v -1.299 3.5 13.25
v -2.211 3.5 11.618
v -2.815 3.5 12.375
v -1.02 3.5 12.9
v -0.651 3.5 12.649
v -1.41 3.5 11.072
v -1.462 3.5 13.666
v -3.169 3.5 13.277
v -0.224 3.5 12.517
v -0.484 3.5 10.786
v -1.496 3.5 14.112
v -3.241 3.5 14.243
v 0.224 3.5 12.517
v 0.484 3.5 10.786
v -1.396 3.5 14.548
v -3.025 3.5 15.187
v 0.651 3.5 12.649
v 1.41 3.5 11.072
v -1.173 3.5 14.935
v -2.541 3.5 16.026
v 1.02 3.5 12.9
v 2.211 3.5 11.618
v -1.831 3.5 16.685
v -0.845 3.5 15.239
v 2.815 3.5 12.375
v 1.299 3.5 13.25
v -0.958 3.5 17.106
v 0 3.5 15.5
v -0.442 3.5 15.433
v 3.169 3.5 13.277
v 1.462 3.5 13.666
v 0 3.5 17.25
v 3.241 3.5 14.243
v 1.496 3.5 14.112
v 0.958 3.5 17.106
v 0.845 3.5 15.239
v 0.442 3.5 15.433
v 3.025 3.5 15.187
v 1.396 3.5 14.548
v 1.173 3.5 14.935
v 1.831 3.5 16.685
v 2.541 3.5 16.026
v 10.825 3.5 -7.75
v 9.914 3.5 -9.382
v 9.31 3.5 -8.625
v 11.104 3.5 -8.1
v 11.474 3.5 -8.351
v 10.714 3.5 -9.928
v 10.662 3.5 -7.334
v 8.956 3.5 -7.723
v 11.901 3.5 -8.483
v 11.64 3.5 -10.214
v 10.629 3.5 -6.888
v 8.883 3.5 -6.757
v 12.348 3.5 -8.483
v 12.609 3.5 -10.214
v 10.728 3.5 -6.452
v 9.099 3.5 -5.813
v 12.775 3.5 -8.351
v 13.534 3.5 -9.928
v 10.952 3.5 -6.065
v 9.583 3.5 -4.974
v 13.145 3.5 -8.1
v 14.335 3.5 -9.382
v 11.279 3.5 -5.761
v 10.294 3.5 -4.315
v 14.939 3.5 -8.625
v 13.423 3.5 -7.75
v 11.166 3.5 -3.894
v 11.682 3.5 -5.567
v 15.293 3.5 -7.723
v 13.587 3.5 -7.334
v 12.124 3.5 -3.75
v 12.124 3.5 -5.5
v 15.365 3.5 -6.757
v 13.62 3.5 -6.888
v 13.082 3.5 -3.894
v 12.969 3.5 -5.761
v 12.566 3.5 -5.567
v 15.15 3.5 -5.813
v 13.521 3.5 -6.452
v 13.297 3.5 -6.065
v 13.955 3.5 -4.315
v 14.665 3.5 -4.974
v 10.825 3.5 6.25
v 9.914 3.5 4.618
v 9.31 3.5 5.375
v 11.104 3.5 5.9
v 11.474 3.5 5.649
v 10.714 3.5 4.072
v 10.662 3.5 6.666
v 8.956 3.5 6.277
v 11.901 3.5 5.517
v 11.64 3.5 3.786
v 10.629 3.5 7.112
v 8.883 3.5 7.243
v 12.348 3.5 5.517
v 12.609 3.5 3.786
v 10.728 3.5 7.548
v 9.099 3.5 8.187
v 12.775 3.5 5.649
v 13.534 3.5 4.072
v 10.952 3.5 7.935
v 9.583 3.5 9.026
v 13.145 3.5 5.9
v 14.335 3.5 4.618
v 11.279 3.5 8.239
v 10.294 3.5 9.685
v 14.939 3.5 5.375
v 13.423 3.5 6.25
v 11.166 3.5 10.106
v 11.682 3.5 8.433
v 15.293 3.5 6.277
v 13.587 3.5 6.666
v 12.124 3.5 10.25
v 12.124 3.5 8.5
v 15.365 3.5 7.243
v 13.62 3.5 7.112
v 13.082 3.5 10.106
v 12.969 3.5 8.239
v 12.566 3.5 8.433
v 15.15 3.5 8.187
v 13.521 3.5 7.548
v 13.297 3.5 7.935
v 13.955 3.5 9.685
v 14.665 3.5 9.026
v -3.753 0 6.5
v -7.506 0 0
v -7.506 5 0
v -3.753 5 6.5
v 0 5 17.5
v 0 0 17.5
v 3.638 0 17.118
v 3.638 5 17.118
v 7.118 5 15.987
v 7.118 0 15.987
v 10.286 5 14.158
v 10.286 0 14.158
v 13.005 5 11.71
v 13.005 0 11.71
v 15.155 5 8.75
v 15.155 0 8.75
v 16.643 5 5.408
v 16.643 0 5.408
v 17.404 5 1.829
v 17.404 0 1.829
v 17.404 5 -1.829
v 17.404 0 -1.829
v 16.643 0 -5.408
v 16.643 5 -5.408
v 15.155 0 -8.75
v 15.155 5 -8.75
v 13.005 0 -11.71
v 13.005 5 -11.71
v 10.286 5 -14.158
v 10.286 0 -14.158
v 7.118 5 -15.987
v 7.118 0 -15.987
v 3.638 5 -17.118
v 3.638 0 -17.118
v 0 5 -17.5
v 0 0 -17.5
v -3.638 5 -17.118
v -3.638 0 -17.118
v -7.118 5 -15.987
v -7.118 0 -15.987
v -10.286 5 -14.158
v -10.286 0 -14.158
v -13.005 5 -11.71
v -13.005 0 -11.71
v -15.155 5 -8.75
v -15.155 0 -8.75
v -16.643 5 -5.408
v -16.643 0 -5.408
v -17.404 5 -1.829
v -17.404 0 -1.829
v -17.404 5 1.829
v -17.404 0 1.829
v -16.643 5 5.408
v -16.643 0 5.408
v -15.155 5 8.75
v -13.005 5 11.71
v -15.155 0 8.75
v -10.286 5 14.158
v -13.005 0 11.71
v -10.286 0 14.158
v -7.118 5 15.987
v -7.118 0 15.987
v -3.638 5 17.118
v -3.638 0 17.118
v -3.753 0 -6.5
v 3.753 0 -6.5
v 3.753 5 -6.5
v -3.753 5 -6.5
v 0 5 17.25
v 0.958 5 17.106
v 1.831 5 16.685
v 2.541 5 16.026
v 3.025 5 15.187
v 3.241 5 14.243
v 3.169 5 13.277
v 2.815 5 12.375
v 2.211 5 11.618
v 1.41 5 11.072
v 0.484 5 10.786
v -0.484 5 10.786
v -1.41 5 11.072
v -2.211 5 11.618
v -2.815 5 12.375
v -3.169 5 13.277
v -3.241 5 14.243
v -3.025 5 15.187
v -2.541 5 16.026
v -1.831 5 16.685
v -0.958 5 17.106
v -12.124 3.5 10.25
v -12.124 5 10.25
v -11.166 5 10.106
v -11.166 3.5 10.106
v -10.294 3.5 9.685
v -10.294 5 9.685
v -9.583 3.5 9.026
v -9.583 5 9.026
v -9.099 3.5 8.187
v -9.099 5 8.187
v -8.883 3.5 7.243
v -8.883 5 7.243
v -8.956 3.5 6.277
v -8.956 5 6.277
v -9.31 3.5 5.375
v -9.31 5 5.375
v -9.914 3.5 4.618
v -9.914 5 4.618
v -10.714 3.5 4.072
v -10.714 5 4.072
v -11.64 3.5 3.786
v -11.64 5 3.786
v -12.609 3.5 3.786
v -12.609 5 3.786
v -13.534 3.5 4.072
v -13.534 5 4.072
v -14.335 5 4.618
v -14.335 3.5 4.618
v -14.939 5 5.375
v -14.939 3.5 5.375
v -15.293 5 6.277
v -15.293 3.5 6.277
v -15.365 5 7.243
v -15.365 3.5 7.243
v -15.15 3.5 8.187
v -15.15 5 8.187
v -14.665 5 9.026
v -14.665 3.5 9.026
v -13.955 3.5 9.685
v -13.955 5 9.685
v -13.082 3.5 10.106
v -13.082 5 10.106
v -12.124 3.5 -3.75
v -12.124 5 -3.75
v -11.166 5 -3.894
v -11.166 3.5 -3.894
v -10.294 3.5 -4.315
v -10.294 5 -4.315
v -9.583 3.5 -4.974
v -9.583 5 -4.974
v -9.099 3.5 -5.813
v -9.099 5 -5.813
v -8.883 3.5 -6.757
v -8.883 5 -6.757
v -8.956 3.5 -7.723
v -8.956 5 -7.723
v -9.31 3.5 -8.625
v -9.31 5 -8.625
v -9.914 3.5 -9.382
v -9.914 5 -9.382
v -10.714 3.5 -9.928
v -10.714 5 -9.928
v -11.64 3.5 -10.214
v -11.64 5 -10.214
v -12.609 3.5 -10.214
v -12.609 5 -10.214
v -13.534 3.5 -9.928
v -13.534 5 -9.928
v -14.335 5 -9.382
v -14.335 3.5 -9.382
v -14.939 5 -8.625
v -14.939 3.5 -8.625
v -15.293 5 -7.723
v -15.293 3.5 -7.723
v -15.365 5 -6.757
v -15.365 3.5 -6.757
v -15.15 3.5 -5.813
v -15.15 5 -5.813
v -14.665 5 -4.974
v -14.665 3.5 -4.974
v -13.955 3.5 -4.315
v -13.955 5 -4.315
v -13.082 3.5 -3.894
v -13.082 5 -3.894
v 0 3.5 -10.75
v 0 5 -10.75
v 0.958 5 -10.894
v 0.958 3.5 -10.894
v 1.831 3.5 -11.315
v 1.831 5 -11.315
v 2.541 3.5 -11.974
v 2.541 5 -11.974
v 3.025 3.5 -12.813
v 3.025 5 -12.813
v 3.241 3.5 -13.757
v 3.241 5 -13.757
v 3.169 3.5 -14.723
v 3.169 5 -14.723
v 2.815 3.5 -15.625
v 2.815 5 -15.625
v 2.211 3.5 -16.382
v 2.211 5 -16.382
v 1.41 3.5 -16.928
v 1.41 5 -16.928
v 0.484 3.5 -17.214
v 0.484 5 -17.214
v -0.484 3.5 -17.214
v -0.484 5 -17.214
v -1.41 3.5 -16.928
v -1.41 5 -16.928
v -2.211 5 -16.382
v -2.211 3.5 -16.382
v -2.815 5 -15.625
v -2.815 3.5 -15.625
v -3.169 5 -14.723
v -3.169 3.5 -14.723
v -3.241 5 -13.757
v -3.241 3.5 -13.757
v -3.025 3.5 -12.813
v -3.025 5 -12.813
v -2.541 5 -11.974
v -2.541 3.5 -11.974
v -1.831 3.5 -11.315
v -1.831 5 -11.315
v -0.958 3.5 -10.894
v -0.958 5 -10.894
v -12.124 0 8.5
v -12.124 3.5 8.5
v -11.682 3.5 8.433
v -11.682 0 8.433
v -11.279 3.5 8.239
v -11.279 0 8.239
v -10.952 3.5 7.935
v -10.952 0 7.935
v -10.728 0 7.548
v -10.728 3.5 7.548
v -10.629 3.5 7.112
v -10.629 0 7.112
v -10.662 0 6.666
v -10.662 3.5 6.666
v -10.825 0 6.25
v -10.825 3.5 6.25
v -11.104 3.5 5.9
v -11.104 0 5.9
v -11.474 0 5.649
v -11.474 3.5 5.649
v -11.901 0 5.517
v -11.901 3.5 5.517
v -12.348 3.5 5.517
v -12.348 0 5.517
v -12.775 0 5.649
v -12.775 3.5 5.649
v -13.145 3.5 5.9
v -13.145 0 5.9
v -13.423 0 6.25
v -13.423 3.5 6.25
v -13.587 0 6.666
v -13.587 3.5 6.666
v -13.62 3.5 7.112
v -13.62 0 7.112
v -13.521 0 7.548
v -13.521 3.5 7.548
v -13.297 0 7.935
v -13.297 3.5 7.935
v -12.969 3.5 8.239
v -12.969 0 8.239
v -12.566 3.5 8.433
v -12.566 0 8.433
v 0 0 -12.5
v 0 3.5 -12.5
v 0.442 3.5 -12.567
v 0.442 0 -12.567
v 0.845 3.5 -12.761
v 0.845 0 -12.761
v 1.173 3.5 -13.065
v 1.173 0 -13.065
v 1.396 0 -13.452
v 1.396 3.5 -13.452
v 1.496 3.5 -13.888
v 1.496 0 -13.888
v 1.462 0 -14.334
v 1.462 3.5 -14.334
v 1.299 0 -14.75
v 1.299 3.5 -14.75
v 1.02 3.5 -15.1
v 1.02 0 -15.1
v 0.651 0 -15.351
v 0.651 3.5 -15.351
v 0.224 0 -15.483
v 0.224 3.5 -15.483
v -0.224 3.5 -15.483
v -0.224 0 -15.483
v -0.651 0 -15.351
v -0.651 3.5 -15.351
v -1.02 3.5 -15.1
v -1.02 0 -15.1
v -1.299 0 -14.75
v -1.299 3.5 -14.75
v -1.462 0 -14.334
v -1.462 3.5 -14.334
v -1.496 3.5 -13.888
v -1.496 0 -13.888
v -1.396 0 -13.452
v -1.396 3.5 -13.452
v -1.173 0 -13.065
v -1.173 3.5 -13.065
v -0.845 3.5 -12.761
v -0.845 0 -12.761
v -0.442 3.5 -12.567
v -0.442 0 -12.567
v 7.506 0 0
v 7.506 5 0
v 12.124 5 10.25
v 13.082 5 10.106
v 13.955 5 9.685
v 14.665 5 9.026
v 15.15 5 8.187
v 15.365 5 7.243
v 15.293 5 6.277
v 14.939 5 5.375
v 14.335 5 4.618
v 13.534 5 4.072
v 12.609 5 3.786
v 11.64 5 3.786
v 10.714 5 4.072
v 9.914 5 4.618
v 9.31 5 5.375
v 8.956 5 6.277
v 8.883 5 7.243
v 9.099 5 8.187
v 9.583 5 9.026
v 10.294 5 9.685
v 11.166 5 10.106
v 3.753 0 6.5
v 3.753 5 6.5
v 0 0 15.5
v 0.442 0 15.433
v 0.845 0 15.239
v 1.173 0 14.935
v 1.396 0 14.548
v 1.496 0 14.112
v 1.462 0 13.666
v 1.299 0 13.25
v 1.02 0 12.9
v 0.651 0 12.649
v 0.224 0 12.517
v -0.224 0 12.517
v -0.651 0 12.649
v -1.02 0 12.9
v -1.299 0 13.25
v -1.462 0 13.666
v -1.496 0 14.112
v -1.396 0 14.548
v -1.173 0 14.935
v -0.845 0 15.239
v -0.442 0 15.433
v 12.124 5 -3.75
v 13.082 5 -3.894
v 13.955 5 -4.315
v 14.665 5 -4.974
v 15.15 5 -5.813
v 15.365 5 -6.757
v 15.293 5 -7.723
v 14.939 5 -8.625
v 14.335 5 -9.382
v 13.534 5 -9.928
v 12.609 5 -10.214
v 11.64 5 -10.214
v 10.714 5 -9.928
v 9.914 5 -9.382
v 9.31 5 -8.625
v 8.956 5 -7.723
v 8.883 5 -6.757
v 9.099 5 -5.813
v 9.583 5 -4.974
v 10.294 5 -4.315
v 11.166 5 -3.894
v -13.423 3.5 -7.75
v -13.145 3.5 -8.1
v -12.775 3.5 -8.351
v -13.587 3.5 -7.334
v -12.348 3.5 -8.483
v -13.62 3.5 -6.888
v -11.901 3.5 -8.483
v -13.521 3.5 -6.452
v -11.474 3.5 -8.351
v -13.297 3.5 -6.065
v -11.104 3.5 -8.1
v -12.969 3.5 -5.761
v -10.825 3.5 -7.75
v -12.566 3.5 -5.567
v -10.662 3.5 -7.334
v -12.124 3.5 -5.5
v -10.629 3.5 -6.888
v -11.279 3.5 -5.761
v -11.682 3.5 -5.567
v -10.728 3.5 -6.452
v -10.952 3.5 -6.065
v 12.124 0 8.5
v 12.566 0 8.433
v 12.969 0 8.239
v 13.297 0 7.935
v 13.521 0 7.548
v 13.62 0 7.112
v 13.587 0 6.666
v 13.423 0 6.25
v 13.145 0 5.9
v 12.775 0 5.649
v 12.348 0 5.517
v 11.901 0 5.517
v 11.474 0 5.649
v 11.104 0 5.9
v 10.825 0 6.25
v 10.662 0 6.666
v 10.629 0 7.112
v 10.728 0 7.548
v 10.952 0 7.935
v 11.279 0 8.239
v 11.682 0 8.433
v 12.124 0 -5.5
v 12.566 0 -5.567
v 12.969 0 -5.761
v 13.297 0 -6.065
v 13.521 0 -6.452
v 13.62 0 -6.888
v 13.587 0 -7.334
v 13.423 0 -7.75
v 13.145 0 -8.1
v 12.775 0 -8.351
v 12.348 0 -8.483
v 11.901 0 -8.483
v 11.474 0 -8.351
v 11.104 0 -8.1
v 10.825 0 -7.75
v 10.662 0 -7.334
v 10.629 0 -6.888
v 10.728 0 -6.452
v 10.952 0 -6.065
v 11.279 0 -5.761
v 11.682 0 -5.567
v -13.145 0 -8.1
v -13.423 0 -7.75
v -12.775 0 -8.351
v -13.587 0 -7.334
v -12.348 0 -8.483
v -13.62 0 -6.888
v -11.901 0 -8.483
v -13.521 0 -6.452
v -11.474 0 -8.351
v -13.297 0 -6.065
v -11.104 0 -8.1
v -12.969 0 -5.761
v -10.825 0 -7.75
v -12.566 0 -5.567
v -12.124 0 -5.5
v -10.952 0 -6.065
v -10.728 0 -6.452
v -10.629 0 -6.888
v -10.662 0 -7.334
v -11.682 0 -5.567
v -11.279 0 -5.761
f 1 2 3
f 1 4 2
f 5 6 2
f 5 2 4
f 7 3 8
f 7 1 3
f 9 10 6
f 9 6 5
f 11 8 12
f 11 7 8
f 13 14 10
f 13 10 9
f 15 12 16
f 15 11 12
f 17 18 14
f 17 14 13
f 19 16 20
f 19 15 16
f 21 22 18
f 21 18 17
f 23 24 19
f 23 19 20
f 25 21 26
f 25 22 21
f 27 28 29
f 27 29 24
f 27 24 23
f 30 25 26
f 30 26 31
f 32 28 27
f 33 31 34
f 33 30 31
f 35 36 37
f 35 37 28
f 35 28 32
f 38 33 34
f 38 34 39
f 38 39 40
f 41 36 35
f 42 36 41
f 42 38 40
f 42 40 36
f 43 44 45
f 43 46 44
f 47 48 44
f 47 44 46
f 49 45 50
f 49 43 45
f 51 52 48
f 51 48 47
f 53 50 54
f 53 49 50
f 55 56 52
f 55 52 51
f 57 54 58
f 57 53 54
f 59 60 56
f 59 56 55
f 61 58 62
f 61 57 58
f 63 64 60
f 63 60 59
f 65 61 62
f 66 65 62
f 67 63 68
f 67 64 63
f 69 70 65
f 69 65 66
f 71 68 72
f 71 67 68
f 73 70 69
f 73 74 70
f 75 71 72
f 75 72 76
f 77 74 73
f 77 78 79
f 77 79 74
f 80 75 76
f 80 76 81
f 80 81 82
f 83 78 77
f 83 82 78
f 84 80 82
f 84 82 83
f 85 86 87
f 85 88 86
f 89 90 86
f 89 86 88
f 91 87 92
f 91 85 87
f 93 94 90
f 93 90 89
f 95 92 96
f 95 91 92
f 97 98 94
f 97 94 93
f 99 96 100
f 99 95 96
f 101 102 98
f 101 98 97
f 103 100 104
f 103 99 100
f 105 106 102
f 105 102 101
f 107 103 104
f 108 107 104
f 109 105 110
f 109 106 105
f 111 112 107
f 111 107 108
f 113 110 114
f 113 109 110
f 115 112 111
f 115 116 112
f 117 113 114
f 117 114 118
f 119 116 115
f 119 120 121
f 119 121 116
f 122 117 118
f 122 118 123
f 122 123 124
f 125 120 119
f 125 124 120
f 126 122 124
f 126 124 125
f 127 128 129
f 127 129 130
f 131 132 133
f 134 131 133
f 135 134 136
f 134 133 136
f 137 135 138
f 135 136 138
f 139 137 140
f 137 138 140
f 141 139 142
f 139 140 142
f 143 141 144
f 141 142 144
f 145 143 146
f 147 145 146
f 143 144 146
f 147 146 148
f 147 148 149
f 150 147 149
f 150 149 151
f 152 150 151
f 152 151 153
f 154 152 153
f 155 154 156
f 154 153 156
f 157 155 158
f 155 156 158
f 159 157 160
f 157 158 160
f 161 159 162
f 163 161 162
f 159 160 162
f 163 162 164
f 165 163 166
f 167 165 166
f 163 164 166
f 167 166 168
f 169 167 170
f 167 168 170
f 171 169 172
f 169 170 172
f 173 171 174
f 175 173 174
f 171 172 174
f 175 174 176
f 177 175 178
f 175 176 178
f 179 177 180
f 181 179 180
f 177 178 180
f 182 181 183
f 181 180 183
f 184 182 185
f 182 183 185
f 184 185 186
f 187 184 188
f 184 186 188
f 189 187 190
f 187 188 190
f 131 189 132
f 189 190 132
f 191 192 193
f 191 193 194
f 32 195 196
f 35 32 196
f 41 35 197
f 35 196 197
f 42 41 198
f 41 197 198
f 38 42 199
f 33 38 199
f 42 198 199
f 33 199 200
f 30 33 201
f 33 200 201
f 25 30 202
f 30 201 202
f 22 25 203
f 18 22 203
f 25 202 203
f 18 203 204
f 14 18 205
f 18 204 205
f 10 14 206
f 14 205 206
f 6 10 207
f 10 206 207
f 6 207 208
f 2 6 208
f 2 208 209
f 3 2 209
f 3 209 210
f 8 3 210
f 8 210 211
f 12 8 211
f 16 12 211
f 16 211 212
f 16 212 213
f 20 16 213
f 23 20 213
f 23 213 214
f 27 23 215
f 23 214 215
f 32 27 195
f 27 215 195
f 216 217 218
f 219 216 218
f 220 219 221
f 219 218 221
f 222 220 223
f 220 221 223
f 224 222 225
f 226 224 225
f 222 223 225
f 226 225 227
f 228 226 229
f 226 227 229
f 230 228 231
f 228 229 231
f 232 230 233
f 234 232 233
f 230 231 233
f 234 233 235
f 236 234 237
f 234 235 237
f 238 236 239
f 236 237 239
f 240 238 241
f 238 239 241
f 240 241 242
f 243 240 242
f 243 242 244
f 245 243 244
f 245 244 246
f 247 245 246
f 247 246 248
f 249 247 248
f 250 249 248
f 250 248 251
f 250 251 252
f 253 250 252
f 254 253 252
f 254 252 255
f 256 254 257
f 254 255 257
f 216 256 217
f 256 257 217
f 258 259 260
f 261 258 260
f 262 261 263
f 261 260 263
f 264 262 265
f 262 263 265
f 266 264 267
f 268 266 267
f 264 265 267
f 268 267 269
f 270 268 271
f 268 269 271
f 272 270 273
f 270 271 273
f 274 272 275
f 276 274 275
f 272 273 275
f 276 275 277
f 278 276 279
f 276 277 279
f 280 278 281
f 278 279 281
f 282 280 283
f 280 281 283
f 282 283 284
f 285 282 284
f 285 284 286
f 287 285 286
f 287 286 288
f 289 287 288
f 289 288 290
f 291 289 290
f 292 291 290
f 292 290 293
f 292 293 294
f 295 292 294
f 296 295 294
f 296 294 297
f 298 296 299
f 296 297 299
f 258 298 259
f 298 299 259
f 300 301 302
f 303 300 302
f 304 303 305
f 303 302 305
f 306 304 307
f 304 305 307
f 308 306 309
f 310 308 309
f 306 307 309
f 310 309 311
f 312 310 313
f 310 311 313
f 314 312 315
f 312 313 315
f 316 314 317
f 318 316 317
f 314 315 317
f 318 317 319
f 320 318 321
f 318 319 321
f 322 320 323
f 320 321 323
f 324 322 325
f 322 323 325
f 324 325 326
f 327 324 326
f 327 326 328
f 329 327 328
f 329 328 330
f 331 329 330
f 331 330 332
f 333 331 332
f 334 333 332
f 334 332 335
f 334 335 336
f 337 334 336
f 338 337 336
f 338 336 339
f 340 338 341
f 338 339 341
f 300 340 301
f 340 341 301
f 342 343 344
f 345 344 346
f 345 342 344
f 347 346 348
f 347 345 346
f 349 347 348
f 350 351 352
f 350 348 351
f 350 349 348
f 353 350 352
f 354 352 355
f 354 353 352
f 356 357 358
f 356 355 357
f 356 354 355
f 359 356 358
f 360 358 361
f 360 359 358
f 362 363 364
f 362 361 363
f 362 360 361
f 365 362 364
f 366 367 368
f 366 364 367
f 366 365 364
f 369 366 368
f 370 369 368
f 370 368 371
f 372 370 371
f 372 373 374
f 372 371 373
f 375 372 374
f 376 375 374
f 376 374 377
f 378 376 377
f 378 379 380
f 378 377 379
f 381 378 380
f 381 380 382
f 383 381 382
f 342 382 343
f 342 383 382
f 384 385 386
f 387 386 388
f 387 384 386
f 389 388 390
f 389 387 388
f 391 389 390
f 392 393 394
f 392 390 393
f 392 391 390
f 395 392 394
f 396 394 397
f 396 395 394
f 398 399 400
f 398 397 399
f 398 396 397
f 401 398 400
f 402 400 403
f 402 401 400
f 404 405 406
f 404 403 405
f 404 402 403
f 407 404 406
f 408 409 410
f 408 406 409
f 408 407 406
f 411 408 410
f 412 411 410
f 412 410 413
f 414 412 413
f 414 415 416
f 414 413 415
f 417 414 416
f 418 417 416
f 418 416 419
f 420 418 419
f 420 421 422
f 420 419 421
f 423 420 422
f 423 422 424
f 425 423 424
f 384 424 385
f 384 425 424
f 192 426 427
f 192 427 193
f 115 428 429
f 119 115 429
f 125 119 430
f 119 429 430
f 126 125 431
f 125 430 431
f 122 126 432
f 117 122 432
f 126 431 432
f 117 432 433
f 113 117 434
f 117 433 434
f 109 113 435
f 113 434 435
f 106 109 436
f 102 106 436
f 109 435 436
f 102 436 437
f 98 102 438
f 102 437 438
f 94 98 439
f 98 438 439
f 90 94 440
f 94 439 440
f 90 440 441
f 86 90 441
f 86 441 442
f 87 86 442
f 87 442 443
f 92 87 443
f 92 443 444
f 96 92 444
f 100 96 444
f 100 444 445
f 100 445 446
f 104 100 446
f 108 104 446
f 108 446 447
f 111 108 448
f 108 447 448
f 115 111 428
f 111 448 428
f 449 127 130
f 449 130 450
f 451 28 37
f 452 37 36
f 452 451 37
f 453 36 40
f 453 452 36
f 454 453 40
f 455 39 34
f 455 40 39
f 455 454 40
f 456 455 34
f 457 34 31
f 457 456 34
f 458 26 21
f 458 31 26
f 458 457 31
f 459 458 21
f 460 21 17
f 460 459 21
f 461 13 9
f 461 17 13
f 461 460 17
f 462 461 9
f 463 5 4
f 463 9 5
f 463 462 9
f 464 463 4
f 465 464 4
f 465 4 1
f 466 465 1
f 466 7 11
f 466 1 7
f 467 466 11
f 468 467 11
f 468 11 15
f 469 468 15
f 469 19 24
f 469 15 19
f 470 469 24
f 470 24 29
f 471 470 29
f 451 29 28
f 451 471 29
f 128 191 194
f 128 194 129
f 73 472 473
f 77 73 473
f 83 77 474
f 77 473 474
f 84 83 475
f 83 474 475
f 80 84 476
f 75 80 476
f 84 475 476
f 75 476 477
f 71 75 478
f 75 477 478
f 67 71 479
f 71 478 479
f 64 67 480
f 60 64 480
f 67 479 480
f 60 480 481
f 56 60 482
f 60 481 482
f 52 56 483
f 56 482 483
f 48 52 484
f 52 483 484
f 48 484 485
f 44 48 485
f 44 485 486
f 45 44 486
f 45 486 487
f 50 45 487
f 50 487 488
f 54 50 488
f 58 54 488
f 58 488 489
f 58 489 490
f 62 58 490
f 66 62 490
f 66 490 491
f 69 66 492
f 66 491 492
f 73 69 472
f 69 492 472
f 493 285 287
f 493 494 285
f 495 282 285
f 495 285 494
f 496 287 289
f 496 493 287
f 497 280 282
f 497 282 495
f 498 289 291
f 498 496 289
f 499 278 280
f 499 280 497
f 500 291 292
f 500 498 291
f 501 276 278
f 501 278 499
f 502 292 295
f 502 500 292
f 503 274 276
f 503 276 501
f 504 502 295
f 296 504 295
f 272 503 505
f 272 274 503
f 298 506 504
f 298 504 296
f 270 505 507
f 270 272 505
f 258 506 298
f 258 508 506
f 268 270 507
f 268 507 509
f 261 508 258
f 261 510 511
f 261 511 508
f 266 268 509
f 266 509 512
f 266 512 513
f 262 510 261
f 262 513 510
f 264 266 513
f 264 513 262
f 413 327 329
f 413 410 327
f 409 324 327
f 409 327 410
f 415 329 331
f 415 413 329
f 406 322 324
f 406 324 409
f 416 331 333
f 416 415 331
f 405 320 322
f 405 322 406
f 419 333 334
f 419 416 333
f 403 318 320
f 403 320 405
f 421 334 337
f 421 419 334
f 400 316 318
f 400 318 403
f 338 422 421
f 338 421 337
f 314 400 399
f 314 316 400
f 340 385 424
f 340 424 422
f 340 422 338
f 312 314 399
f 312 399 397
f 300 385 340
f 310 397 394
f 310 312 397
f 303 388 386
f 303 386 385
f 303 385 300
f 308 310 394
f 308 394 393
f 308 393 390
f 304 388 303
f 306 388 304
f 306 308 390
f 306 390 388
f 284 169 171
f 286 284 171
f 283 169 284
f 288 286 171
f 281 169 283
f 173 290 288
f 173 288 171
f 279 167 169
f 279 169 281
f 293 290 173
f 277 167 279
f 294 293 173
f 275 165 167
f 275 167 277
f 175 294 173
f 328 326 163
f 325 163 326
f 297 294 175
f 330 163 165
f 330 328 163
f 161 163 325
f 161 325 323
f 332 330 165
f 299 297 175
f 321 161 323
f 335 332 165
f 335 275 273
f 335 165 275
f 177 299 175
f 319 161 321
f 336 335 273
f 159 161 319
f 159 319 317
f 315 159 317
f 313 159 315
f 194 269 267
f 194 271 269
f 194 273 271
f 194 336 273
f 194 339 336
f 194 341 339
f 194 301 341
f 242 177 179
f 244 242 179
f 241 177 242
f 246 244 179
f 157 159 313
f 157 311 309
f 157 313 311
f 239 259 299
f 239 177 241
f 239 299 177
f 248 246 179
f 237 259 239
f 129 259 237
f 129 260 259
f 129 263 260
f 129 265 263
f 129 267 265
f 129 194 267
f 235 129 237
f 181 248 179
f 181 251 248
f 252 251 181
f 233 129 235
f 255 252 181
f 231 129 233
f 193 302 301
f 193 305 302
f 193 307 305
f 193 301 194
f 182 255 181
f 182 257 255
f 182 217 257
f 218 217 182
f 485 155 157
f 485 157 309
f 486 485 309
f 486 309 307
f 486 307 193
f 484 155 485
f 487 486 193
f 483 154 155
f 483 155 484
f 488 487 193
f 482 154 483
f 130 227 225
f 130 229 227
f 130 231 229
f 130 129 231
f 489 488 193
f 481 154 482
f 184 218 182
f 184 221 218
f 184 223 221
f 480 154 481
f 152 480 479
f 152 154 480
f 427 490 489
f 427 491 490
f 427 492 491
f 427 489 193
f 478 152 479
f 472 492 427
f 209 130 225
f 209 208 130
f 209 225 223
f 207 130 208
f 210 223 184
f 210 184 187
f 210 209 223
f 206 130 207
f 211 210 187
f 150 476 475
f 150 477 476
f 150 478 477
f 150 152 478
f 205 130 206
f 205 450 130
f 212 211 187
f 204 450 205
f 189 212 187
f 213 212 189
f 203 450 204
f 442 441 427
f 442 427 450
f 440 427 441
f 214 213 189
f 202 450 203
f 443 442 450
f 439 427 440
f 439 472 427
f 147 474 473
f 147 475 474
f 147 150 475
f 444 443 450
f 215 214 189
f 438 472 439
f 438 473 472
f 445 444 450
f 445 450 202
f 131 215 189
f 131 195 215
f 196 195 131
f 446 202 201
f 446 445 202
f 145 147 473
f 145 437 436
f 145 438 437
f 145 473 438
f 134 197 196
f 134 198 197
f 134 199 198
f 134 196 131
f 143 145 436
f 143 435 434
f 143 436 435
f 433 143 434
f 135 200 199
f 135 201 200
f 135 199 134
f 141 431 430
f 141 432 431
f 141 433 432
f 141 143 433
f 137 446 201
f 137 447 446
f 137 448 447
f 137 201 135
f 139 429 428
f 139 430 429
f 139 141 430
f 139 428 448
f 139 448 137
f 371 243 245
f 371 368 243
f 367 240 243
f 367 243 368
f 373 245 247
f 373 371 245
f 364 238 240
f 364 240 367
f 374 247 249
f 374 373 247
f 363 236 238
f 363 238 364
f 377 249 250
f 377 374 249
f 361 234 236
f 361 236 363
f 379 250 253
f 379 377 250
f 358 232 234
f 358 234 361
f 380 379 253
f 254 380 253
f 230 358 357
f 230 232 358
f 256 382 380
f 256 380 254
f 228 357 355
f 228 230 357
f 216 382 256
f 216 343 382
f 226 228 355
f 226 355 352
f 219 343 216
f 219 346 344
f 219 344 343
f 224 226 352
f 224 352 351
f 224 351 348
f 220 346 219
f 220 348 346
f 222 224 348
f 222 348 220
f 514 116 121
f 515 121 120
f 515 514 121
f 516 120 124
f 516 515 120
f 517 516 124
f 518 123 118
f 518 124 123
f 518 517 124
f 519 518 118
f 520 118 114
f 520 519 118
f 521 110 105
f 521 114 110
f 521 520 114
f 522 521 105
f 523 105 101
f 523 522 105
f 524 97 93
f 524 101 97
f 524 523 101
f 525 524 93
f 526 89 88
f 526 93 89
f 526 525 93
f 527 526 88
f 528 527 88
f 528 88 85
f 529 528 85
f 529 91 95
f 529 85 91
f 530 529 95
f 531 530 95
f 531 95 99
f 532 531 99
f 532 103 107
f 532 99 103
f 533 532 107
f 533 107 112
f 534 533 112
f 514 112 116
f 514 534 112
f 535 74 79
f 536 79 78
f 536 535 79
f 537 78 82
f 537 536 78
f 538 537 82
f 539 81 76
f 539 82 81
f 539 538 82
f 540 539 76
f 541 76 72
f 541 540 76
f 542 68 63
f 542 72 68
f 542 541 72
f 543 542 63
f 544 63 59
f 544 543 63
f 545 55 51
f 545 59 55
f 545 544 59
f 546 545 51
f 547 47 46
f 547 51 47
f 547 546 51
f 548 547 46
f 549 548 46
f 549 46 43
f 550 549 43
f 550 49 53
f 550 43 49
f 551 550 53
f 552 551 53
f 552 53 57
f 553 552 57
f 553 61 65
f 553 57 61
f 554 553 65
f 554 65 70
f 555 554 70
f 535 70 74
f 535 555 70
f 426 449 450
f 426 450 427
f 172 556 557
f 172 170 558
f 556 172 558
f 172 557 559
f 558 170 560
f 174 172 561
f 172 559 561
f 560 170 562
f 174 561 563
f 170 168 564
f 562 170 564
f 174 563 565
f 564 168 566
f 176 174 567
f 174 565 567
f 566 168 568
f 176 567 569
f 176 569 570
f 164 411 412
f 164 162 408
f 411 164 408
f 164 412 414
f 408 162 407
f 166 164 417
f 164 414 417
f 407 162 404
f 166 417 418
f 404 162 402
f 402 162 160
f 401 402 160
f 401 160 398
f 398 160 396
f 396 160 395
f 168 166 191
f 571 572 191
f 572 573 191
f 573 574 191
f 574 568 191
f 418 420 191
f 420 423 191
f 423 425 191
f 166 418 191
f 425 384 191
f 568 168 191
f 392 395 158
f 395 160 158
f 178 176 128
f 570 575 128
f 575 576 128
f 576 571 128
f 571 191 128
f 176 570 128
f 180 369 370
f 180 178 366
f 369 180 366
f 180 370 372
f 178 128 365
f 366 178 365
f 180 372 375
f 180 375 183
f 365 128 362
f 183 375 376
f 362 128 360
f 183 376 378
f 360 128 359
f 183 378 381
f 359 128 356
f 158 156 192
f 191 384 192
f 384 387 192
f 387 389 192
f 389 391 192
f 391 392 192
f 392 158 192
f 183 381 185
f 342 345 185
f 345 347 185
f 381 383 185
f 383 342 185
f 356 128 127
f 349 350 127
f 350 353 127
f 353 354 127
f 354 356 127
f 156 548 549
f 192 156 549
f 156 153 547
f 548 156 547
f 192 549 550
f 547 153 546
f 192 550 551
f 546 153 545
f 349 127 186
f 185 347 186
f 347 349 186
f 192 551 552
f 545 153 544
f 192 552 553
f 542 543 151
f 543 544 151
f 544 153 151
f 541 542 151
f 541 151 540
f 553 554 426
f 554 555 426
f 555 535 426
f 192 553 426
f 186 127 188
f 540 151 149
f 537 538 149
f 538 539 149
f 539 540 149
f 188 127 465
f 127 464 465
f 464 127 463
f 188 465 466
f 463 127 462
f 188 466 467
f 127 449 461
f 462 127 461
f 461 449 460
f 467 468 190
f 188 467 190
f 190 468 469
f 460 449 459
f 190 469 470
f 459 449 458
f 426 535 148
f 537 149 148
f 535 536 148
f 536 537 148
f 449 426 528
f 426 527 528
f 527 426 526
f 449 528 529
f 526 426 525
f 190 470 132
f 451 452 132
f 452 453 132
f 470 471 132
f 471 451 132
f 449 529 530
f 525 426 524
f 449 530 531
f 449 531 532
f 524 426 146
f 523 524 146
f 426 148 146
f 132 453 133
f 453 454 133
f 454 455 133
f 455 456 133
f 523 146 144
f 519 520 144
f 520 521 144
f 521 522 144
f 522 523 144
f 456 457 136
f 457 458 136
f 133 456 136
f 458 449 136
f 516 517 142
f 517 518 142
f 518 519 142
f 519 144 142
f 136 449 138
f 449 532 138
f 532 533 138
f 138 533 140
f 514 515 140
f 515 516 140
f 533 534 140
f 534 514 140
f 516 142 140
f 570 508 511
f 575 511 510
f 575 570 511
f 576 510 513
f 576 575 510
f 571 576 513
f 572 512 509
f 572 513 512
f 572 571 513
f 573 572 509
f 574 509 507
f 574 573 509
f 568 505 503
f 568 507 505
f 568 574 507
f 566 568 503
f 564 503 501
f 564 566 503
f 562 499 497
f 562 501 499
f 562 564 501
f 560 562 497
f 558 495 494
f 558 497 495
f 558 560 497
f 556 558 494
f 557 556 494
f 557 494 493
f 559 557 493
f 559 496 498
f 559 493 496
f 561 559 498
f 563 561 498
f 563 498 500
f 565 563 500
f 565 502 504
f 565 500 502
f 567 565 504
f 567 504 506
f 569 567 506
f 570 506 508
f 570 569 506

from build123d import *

# Parameters (mm, degrees)
SKETCH1_R           = 17.5
SKETCH1_R_2         = 1.5
BOSS_EXTRUDE1_DEPTH = 5
SKETCH2_R           = 3.25
CUT_EXTRUDE1_DEPTH  = 1.5


with BuildPart() as part:
    # Sketch1 → Boss-Extrude1 (new body)
    with BuildSketch(Plane(origin=(0, 0, 0), x_dir=(1, 0, 0), z_dir=(0, 1, 0))):
        with Locations(Location((0, 0, 0), (0, 0, 270))):
            Circle(SKETCH1_R)
        with Locations(Location((0, 14, 0), (0, 0, 270))):
            Circle(SKETCH1_R_2, mode=Mode.SUBTRACT)
        with Locations(Location((12.124355653, 7, 0), (0, 0, 270))):
            Circle(SKETCH1_R_2, mode=Mode.SUBTRACT)
        with Locations(Location((12.124355653, -7, 0), (0, 0, 270))):
            Circle(SKETCH1_R_2, mode=Mode.SUBTRACT)
        with Locations(Location((0, -14, 0), (0, 0, 270))):
            Circle(SKETCH1_R_2, mode=Mode.SUBTRACT)
        with Locations(Location((-12.124355653, -7, 0), (0, 0, 270))):
            Circle(SKETCH1_R_2, mode=Mode.SUBTRACT)
        with Locations(Location((-12.124355653, 7, 0), (0, 0, 270))):
            Circle(SKETCH1_R_2, mode=Mode.SUBTRACT)
        Polygon((7.505553499, 0), (3.75277675, 6.5), (-3.75277675, 6.5), (-7.505553499, 0), (-3.75277675, -6.5), (3.75277675, -6.5), align=None, mode=Mode.SUBTRACT)
    extrude(amount=BOSS_EXTRUDE1_DEPTH)

    # Sketch2 → Cut-Extrude1 (cut)
    with BuildSketch(Plane(origin=(0, 5, 0), x_dir=(1, 0, 0), z_dir=(0, 1, 0))):
        with Locations(Location((0, 14, 0), (0, 0, 270))):
            Circle(SKETCH2_R)
        with Locations(Location((12.124355653, 7, 0), (0, 0, 270))):
            Circle(SKETCH2_R)
        with Locations(Location((12.124355653, -7, 0), (0, 0, 270))):
            Circle(SKETCH2_R)
        with Locations(Location((0, -14, 0), (0, 0, 270))):
            Circle(SKETCH2_R)
        with Locations(Location((-12.124355653, -7, 0), (0, 0, 270))):
            Circle(SKETCH2_R)
        with Locations(Location((-12.124355653, 7, 0), (0, 0, 270))):
            Circle(SKETCH2_R)
    extrude(amount=-CUT_EXTRUDE1_DEPTH, mode=Mode.SUBTRACT)


solid = part.part
